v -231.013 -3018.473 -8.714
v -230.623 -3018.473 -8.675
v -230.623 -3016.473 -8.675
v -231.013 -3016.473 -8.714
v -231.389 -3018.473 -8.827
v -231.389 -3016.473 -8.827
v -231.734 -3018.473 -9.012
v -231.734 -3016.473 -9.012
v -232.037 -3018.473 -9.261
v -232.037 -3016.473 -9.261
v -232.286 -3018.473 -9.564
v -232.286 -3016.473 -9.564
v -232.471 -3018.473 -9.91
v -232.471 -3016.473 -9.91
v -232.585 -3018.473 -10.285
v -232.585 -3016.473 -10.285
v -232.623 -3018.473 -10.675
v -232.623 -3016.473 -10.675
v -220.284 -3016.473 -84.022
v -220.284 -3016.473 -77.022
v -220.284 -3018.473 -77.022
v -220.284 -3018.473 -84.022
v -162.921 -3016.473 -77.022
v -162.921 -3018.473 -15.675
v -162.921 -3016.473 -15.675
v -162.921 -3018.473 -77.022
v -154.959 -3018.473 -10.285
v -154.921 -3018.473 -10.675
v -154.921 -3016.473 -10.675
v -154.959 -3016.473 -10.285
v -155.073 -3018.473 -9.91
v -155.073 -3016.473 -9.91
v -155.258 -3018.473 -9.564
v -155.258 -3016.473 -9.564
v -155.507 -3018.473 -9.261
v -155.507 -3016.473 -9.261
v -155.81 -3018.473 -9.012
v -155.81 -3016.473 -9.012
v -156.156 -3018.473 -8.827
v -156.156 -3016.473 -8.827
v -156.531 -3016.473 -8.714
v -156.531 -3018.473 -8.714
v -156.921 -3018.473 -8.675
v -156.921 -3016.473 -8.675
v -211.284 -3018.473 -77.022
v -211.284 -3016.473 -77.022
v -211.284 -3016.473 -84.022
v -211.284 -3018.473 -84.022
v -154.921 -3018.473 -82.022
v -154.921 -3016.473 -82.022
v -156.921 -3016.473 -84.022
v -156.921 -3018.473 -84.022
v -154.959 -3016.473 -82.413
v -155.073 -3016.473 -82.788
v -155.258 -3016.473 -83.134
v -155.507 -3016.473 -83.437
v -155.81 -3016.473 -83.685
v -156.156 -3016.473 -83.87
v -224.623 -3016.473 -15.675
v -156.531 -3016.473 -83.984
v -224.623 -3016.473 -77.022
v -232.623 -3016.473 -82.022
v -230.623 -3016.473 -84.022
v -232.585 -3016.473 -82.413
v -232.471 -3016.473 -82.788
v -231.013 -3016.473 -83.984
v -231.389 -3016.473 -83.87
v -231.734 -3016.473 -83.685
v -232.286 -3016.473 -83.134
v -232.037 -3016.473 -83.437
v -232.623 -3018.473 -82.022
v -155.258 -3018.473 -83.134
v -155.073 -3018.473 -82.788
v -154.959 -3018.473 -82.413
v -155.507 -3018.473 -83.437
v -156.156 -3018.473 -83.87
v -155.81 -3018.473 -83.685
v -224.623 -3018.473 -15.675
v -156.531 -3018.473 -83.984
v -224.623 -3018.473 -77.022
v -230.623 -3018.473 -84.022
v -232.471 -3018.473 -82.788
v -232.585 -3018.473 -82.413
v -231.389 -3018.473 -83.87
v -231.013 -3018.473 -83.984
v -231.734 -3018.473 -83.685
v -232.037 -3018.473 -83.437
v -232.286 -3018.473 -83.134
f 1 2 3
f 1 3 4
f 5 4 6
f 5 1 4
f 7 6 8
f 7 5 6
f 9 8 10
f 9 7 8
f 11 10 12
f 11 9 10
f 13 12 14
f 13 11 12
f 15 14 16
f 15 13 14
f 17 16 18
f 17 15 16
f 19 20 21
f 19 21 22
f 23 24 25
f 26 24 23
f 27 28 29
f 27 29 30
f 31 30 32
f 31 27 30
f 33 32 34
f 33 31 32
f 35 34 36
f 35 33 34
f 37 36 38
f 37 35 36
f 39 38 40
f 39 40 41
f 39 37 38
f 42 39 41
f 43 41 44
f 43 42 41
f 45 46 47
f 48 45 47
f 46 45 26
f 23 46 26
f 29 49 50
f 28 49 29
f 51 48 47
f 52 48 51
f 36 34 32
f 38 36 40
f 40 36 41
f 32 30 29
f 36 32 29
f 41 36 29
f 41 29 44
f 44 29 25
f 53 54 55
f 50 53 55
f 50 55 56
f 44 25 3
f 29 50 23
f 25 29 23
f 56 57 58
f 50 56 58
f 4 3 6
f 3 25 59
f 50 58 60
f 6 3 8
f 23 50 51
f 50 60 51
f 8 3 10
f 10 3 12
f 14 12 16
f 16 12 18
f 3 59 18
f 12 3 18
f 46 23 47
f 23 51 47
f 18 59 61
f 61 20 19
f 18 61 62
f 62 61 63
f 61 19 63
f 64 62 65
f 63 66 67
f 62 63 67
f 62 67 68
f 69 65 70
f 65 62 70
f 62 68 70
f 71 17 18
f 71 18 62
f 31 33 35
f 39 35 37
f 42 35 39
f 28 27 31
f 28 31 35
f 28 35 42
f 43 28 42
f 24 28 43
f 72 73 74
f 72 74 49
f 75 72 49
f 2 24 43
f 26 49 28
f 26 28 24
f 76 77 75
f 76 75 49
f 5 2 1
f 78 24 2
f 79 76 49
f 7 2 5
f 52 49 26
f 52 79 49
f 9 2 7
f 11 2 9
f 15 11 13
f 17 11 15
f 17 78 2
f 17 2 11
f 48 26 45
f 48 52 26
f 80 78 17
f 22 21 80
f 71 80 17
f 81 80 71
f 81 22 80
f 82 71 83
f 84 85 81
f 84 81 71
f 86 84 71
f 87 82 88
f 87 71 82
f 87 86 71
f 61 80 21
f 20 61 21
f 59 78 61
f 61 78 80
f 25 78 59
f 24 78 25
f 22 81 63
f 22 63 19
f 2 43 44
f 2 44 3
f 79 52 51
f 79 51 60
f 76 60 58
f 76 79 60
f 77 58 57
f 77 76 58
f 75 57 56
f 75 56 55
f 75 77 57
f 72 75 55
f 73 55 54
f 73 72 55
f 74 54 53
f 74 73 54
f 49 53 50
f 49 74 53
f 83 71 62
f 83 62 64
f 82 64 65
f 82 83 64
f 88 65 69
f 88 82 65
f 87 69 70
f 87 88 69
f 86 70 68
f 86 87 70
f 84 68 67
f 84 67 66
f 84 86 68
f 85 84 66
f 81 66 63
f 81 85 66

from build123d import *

# Parameters (mm, degrees)
SKETCH_1_W          = 61.702142611
SKETCH_1_H          = 61.347239899
EXTRUDE_1_DEPTH     = 2
SKETCH_2_W          = 9
SKETCH_2_H          = 7
CUT_EXTRUDE_1_DEPTH = 2


with BuildPart() as part:
    # 草图1 → 凸台-拉伸1 (new body)
    with BuildSketch(Plane(origin=(-113.392096834, -3018.473189006, -237.947347726), x_dir=(1, 0, 0), z_dir=(0, 1, 0))):
        with BuildLine():
            Line((-117.231072015, -153.924864972), (-43.528929404, -153.924864972))
            ThreePointArc((-43.528929404, -153.924864972), (-42.114715842, -154.510651409), (-41.528929404, -155.924864972))
            Line((-41.528929404, -155.924864972), (-41.528929404, -227.272104871))
            ThreePointArc((-41.528929404, -227.272104871), (-42.114715842, -228.686318433), (-43.528929404, -229.272104871))
            Line((-43.528929404, -229.272104871), (-117.231072015, -229.272104871))
            ThreePointArc((-117.231072015, -229.272104871), (-118.645285578, -228.686318433), (-119.231072015, -227.272104871))
            Line((-119.231072015, -227.272104871), (-119.231072015, -155.924864972))
            ThreePointArc((-119.231072015, -155.924864972), (-118.645285578, -154.510651409), (-117.231072015, -153.924864972))
        make_face()
        with Locations((-80.38000071, -191.598484922)):
            Rectangle(SKETCH_1_W, SKETCH_1_H, mode=Mode.SUBTRACT)
    extrude(amount=EXTRUDE_1_DEPTH)

    # 草图2 → 切除-拉伸1 (cut)
    with BuildSketch(Plane(origin=(0, -3016.473189006, 0), x_dir=(1, 0, 0), z_dir=(0, 1, 0))):
        with Locations((-215.784101988, 80.522482755)):
            Rectangle(SKETCH_2_W, SKETCH_2_H)
    extrude(amount=-CUT_EXTRUDE_1_DEPTH, mode=Mode.SUBTRACT)


solid = part.part
